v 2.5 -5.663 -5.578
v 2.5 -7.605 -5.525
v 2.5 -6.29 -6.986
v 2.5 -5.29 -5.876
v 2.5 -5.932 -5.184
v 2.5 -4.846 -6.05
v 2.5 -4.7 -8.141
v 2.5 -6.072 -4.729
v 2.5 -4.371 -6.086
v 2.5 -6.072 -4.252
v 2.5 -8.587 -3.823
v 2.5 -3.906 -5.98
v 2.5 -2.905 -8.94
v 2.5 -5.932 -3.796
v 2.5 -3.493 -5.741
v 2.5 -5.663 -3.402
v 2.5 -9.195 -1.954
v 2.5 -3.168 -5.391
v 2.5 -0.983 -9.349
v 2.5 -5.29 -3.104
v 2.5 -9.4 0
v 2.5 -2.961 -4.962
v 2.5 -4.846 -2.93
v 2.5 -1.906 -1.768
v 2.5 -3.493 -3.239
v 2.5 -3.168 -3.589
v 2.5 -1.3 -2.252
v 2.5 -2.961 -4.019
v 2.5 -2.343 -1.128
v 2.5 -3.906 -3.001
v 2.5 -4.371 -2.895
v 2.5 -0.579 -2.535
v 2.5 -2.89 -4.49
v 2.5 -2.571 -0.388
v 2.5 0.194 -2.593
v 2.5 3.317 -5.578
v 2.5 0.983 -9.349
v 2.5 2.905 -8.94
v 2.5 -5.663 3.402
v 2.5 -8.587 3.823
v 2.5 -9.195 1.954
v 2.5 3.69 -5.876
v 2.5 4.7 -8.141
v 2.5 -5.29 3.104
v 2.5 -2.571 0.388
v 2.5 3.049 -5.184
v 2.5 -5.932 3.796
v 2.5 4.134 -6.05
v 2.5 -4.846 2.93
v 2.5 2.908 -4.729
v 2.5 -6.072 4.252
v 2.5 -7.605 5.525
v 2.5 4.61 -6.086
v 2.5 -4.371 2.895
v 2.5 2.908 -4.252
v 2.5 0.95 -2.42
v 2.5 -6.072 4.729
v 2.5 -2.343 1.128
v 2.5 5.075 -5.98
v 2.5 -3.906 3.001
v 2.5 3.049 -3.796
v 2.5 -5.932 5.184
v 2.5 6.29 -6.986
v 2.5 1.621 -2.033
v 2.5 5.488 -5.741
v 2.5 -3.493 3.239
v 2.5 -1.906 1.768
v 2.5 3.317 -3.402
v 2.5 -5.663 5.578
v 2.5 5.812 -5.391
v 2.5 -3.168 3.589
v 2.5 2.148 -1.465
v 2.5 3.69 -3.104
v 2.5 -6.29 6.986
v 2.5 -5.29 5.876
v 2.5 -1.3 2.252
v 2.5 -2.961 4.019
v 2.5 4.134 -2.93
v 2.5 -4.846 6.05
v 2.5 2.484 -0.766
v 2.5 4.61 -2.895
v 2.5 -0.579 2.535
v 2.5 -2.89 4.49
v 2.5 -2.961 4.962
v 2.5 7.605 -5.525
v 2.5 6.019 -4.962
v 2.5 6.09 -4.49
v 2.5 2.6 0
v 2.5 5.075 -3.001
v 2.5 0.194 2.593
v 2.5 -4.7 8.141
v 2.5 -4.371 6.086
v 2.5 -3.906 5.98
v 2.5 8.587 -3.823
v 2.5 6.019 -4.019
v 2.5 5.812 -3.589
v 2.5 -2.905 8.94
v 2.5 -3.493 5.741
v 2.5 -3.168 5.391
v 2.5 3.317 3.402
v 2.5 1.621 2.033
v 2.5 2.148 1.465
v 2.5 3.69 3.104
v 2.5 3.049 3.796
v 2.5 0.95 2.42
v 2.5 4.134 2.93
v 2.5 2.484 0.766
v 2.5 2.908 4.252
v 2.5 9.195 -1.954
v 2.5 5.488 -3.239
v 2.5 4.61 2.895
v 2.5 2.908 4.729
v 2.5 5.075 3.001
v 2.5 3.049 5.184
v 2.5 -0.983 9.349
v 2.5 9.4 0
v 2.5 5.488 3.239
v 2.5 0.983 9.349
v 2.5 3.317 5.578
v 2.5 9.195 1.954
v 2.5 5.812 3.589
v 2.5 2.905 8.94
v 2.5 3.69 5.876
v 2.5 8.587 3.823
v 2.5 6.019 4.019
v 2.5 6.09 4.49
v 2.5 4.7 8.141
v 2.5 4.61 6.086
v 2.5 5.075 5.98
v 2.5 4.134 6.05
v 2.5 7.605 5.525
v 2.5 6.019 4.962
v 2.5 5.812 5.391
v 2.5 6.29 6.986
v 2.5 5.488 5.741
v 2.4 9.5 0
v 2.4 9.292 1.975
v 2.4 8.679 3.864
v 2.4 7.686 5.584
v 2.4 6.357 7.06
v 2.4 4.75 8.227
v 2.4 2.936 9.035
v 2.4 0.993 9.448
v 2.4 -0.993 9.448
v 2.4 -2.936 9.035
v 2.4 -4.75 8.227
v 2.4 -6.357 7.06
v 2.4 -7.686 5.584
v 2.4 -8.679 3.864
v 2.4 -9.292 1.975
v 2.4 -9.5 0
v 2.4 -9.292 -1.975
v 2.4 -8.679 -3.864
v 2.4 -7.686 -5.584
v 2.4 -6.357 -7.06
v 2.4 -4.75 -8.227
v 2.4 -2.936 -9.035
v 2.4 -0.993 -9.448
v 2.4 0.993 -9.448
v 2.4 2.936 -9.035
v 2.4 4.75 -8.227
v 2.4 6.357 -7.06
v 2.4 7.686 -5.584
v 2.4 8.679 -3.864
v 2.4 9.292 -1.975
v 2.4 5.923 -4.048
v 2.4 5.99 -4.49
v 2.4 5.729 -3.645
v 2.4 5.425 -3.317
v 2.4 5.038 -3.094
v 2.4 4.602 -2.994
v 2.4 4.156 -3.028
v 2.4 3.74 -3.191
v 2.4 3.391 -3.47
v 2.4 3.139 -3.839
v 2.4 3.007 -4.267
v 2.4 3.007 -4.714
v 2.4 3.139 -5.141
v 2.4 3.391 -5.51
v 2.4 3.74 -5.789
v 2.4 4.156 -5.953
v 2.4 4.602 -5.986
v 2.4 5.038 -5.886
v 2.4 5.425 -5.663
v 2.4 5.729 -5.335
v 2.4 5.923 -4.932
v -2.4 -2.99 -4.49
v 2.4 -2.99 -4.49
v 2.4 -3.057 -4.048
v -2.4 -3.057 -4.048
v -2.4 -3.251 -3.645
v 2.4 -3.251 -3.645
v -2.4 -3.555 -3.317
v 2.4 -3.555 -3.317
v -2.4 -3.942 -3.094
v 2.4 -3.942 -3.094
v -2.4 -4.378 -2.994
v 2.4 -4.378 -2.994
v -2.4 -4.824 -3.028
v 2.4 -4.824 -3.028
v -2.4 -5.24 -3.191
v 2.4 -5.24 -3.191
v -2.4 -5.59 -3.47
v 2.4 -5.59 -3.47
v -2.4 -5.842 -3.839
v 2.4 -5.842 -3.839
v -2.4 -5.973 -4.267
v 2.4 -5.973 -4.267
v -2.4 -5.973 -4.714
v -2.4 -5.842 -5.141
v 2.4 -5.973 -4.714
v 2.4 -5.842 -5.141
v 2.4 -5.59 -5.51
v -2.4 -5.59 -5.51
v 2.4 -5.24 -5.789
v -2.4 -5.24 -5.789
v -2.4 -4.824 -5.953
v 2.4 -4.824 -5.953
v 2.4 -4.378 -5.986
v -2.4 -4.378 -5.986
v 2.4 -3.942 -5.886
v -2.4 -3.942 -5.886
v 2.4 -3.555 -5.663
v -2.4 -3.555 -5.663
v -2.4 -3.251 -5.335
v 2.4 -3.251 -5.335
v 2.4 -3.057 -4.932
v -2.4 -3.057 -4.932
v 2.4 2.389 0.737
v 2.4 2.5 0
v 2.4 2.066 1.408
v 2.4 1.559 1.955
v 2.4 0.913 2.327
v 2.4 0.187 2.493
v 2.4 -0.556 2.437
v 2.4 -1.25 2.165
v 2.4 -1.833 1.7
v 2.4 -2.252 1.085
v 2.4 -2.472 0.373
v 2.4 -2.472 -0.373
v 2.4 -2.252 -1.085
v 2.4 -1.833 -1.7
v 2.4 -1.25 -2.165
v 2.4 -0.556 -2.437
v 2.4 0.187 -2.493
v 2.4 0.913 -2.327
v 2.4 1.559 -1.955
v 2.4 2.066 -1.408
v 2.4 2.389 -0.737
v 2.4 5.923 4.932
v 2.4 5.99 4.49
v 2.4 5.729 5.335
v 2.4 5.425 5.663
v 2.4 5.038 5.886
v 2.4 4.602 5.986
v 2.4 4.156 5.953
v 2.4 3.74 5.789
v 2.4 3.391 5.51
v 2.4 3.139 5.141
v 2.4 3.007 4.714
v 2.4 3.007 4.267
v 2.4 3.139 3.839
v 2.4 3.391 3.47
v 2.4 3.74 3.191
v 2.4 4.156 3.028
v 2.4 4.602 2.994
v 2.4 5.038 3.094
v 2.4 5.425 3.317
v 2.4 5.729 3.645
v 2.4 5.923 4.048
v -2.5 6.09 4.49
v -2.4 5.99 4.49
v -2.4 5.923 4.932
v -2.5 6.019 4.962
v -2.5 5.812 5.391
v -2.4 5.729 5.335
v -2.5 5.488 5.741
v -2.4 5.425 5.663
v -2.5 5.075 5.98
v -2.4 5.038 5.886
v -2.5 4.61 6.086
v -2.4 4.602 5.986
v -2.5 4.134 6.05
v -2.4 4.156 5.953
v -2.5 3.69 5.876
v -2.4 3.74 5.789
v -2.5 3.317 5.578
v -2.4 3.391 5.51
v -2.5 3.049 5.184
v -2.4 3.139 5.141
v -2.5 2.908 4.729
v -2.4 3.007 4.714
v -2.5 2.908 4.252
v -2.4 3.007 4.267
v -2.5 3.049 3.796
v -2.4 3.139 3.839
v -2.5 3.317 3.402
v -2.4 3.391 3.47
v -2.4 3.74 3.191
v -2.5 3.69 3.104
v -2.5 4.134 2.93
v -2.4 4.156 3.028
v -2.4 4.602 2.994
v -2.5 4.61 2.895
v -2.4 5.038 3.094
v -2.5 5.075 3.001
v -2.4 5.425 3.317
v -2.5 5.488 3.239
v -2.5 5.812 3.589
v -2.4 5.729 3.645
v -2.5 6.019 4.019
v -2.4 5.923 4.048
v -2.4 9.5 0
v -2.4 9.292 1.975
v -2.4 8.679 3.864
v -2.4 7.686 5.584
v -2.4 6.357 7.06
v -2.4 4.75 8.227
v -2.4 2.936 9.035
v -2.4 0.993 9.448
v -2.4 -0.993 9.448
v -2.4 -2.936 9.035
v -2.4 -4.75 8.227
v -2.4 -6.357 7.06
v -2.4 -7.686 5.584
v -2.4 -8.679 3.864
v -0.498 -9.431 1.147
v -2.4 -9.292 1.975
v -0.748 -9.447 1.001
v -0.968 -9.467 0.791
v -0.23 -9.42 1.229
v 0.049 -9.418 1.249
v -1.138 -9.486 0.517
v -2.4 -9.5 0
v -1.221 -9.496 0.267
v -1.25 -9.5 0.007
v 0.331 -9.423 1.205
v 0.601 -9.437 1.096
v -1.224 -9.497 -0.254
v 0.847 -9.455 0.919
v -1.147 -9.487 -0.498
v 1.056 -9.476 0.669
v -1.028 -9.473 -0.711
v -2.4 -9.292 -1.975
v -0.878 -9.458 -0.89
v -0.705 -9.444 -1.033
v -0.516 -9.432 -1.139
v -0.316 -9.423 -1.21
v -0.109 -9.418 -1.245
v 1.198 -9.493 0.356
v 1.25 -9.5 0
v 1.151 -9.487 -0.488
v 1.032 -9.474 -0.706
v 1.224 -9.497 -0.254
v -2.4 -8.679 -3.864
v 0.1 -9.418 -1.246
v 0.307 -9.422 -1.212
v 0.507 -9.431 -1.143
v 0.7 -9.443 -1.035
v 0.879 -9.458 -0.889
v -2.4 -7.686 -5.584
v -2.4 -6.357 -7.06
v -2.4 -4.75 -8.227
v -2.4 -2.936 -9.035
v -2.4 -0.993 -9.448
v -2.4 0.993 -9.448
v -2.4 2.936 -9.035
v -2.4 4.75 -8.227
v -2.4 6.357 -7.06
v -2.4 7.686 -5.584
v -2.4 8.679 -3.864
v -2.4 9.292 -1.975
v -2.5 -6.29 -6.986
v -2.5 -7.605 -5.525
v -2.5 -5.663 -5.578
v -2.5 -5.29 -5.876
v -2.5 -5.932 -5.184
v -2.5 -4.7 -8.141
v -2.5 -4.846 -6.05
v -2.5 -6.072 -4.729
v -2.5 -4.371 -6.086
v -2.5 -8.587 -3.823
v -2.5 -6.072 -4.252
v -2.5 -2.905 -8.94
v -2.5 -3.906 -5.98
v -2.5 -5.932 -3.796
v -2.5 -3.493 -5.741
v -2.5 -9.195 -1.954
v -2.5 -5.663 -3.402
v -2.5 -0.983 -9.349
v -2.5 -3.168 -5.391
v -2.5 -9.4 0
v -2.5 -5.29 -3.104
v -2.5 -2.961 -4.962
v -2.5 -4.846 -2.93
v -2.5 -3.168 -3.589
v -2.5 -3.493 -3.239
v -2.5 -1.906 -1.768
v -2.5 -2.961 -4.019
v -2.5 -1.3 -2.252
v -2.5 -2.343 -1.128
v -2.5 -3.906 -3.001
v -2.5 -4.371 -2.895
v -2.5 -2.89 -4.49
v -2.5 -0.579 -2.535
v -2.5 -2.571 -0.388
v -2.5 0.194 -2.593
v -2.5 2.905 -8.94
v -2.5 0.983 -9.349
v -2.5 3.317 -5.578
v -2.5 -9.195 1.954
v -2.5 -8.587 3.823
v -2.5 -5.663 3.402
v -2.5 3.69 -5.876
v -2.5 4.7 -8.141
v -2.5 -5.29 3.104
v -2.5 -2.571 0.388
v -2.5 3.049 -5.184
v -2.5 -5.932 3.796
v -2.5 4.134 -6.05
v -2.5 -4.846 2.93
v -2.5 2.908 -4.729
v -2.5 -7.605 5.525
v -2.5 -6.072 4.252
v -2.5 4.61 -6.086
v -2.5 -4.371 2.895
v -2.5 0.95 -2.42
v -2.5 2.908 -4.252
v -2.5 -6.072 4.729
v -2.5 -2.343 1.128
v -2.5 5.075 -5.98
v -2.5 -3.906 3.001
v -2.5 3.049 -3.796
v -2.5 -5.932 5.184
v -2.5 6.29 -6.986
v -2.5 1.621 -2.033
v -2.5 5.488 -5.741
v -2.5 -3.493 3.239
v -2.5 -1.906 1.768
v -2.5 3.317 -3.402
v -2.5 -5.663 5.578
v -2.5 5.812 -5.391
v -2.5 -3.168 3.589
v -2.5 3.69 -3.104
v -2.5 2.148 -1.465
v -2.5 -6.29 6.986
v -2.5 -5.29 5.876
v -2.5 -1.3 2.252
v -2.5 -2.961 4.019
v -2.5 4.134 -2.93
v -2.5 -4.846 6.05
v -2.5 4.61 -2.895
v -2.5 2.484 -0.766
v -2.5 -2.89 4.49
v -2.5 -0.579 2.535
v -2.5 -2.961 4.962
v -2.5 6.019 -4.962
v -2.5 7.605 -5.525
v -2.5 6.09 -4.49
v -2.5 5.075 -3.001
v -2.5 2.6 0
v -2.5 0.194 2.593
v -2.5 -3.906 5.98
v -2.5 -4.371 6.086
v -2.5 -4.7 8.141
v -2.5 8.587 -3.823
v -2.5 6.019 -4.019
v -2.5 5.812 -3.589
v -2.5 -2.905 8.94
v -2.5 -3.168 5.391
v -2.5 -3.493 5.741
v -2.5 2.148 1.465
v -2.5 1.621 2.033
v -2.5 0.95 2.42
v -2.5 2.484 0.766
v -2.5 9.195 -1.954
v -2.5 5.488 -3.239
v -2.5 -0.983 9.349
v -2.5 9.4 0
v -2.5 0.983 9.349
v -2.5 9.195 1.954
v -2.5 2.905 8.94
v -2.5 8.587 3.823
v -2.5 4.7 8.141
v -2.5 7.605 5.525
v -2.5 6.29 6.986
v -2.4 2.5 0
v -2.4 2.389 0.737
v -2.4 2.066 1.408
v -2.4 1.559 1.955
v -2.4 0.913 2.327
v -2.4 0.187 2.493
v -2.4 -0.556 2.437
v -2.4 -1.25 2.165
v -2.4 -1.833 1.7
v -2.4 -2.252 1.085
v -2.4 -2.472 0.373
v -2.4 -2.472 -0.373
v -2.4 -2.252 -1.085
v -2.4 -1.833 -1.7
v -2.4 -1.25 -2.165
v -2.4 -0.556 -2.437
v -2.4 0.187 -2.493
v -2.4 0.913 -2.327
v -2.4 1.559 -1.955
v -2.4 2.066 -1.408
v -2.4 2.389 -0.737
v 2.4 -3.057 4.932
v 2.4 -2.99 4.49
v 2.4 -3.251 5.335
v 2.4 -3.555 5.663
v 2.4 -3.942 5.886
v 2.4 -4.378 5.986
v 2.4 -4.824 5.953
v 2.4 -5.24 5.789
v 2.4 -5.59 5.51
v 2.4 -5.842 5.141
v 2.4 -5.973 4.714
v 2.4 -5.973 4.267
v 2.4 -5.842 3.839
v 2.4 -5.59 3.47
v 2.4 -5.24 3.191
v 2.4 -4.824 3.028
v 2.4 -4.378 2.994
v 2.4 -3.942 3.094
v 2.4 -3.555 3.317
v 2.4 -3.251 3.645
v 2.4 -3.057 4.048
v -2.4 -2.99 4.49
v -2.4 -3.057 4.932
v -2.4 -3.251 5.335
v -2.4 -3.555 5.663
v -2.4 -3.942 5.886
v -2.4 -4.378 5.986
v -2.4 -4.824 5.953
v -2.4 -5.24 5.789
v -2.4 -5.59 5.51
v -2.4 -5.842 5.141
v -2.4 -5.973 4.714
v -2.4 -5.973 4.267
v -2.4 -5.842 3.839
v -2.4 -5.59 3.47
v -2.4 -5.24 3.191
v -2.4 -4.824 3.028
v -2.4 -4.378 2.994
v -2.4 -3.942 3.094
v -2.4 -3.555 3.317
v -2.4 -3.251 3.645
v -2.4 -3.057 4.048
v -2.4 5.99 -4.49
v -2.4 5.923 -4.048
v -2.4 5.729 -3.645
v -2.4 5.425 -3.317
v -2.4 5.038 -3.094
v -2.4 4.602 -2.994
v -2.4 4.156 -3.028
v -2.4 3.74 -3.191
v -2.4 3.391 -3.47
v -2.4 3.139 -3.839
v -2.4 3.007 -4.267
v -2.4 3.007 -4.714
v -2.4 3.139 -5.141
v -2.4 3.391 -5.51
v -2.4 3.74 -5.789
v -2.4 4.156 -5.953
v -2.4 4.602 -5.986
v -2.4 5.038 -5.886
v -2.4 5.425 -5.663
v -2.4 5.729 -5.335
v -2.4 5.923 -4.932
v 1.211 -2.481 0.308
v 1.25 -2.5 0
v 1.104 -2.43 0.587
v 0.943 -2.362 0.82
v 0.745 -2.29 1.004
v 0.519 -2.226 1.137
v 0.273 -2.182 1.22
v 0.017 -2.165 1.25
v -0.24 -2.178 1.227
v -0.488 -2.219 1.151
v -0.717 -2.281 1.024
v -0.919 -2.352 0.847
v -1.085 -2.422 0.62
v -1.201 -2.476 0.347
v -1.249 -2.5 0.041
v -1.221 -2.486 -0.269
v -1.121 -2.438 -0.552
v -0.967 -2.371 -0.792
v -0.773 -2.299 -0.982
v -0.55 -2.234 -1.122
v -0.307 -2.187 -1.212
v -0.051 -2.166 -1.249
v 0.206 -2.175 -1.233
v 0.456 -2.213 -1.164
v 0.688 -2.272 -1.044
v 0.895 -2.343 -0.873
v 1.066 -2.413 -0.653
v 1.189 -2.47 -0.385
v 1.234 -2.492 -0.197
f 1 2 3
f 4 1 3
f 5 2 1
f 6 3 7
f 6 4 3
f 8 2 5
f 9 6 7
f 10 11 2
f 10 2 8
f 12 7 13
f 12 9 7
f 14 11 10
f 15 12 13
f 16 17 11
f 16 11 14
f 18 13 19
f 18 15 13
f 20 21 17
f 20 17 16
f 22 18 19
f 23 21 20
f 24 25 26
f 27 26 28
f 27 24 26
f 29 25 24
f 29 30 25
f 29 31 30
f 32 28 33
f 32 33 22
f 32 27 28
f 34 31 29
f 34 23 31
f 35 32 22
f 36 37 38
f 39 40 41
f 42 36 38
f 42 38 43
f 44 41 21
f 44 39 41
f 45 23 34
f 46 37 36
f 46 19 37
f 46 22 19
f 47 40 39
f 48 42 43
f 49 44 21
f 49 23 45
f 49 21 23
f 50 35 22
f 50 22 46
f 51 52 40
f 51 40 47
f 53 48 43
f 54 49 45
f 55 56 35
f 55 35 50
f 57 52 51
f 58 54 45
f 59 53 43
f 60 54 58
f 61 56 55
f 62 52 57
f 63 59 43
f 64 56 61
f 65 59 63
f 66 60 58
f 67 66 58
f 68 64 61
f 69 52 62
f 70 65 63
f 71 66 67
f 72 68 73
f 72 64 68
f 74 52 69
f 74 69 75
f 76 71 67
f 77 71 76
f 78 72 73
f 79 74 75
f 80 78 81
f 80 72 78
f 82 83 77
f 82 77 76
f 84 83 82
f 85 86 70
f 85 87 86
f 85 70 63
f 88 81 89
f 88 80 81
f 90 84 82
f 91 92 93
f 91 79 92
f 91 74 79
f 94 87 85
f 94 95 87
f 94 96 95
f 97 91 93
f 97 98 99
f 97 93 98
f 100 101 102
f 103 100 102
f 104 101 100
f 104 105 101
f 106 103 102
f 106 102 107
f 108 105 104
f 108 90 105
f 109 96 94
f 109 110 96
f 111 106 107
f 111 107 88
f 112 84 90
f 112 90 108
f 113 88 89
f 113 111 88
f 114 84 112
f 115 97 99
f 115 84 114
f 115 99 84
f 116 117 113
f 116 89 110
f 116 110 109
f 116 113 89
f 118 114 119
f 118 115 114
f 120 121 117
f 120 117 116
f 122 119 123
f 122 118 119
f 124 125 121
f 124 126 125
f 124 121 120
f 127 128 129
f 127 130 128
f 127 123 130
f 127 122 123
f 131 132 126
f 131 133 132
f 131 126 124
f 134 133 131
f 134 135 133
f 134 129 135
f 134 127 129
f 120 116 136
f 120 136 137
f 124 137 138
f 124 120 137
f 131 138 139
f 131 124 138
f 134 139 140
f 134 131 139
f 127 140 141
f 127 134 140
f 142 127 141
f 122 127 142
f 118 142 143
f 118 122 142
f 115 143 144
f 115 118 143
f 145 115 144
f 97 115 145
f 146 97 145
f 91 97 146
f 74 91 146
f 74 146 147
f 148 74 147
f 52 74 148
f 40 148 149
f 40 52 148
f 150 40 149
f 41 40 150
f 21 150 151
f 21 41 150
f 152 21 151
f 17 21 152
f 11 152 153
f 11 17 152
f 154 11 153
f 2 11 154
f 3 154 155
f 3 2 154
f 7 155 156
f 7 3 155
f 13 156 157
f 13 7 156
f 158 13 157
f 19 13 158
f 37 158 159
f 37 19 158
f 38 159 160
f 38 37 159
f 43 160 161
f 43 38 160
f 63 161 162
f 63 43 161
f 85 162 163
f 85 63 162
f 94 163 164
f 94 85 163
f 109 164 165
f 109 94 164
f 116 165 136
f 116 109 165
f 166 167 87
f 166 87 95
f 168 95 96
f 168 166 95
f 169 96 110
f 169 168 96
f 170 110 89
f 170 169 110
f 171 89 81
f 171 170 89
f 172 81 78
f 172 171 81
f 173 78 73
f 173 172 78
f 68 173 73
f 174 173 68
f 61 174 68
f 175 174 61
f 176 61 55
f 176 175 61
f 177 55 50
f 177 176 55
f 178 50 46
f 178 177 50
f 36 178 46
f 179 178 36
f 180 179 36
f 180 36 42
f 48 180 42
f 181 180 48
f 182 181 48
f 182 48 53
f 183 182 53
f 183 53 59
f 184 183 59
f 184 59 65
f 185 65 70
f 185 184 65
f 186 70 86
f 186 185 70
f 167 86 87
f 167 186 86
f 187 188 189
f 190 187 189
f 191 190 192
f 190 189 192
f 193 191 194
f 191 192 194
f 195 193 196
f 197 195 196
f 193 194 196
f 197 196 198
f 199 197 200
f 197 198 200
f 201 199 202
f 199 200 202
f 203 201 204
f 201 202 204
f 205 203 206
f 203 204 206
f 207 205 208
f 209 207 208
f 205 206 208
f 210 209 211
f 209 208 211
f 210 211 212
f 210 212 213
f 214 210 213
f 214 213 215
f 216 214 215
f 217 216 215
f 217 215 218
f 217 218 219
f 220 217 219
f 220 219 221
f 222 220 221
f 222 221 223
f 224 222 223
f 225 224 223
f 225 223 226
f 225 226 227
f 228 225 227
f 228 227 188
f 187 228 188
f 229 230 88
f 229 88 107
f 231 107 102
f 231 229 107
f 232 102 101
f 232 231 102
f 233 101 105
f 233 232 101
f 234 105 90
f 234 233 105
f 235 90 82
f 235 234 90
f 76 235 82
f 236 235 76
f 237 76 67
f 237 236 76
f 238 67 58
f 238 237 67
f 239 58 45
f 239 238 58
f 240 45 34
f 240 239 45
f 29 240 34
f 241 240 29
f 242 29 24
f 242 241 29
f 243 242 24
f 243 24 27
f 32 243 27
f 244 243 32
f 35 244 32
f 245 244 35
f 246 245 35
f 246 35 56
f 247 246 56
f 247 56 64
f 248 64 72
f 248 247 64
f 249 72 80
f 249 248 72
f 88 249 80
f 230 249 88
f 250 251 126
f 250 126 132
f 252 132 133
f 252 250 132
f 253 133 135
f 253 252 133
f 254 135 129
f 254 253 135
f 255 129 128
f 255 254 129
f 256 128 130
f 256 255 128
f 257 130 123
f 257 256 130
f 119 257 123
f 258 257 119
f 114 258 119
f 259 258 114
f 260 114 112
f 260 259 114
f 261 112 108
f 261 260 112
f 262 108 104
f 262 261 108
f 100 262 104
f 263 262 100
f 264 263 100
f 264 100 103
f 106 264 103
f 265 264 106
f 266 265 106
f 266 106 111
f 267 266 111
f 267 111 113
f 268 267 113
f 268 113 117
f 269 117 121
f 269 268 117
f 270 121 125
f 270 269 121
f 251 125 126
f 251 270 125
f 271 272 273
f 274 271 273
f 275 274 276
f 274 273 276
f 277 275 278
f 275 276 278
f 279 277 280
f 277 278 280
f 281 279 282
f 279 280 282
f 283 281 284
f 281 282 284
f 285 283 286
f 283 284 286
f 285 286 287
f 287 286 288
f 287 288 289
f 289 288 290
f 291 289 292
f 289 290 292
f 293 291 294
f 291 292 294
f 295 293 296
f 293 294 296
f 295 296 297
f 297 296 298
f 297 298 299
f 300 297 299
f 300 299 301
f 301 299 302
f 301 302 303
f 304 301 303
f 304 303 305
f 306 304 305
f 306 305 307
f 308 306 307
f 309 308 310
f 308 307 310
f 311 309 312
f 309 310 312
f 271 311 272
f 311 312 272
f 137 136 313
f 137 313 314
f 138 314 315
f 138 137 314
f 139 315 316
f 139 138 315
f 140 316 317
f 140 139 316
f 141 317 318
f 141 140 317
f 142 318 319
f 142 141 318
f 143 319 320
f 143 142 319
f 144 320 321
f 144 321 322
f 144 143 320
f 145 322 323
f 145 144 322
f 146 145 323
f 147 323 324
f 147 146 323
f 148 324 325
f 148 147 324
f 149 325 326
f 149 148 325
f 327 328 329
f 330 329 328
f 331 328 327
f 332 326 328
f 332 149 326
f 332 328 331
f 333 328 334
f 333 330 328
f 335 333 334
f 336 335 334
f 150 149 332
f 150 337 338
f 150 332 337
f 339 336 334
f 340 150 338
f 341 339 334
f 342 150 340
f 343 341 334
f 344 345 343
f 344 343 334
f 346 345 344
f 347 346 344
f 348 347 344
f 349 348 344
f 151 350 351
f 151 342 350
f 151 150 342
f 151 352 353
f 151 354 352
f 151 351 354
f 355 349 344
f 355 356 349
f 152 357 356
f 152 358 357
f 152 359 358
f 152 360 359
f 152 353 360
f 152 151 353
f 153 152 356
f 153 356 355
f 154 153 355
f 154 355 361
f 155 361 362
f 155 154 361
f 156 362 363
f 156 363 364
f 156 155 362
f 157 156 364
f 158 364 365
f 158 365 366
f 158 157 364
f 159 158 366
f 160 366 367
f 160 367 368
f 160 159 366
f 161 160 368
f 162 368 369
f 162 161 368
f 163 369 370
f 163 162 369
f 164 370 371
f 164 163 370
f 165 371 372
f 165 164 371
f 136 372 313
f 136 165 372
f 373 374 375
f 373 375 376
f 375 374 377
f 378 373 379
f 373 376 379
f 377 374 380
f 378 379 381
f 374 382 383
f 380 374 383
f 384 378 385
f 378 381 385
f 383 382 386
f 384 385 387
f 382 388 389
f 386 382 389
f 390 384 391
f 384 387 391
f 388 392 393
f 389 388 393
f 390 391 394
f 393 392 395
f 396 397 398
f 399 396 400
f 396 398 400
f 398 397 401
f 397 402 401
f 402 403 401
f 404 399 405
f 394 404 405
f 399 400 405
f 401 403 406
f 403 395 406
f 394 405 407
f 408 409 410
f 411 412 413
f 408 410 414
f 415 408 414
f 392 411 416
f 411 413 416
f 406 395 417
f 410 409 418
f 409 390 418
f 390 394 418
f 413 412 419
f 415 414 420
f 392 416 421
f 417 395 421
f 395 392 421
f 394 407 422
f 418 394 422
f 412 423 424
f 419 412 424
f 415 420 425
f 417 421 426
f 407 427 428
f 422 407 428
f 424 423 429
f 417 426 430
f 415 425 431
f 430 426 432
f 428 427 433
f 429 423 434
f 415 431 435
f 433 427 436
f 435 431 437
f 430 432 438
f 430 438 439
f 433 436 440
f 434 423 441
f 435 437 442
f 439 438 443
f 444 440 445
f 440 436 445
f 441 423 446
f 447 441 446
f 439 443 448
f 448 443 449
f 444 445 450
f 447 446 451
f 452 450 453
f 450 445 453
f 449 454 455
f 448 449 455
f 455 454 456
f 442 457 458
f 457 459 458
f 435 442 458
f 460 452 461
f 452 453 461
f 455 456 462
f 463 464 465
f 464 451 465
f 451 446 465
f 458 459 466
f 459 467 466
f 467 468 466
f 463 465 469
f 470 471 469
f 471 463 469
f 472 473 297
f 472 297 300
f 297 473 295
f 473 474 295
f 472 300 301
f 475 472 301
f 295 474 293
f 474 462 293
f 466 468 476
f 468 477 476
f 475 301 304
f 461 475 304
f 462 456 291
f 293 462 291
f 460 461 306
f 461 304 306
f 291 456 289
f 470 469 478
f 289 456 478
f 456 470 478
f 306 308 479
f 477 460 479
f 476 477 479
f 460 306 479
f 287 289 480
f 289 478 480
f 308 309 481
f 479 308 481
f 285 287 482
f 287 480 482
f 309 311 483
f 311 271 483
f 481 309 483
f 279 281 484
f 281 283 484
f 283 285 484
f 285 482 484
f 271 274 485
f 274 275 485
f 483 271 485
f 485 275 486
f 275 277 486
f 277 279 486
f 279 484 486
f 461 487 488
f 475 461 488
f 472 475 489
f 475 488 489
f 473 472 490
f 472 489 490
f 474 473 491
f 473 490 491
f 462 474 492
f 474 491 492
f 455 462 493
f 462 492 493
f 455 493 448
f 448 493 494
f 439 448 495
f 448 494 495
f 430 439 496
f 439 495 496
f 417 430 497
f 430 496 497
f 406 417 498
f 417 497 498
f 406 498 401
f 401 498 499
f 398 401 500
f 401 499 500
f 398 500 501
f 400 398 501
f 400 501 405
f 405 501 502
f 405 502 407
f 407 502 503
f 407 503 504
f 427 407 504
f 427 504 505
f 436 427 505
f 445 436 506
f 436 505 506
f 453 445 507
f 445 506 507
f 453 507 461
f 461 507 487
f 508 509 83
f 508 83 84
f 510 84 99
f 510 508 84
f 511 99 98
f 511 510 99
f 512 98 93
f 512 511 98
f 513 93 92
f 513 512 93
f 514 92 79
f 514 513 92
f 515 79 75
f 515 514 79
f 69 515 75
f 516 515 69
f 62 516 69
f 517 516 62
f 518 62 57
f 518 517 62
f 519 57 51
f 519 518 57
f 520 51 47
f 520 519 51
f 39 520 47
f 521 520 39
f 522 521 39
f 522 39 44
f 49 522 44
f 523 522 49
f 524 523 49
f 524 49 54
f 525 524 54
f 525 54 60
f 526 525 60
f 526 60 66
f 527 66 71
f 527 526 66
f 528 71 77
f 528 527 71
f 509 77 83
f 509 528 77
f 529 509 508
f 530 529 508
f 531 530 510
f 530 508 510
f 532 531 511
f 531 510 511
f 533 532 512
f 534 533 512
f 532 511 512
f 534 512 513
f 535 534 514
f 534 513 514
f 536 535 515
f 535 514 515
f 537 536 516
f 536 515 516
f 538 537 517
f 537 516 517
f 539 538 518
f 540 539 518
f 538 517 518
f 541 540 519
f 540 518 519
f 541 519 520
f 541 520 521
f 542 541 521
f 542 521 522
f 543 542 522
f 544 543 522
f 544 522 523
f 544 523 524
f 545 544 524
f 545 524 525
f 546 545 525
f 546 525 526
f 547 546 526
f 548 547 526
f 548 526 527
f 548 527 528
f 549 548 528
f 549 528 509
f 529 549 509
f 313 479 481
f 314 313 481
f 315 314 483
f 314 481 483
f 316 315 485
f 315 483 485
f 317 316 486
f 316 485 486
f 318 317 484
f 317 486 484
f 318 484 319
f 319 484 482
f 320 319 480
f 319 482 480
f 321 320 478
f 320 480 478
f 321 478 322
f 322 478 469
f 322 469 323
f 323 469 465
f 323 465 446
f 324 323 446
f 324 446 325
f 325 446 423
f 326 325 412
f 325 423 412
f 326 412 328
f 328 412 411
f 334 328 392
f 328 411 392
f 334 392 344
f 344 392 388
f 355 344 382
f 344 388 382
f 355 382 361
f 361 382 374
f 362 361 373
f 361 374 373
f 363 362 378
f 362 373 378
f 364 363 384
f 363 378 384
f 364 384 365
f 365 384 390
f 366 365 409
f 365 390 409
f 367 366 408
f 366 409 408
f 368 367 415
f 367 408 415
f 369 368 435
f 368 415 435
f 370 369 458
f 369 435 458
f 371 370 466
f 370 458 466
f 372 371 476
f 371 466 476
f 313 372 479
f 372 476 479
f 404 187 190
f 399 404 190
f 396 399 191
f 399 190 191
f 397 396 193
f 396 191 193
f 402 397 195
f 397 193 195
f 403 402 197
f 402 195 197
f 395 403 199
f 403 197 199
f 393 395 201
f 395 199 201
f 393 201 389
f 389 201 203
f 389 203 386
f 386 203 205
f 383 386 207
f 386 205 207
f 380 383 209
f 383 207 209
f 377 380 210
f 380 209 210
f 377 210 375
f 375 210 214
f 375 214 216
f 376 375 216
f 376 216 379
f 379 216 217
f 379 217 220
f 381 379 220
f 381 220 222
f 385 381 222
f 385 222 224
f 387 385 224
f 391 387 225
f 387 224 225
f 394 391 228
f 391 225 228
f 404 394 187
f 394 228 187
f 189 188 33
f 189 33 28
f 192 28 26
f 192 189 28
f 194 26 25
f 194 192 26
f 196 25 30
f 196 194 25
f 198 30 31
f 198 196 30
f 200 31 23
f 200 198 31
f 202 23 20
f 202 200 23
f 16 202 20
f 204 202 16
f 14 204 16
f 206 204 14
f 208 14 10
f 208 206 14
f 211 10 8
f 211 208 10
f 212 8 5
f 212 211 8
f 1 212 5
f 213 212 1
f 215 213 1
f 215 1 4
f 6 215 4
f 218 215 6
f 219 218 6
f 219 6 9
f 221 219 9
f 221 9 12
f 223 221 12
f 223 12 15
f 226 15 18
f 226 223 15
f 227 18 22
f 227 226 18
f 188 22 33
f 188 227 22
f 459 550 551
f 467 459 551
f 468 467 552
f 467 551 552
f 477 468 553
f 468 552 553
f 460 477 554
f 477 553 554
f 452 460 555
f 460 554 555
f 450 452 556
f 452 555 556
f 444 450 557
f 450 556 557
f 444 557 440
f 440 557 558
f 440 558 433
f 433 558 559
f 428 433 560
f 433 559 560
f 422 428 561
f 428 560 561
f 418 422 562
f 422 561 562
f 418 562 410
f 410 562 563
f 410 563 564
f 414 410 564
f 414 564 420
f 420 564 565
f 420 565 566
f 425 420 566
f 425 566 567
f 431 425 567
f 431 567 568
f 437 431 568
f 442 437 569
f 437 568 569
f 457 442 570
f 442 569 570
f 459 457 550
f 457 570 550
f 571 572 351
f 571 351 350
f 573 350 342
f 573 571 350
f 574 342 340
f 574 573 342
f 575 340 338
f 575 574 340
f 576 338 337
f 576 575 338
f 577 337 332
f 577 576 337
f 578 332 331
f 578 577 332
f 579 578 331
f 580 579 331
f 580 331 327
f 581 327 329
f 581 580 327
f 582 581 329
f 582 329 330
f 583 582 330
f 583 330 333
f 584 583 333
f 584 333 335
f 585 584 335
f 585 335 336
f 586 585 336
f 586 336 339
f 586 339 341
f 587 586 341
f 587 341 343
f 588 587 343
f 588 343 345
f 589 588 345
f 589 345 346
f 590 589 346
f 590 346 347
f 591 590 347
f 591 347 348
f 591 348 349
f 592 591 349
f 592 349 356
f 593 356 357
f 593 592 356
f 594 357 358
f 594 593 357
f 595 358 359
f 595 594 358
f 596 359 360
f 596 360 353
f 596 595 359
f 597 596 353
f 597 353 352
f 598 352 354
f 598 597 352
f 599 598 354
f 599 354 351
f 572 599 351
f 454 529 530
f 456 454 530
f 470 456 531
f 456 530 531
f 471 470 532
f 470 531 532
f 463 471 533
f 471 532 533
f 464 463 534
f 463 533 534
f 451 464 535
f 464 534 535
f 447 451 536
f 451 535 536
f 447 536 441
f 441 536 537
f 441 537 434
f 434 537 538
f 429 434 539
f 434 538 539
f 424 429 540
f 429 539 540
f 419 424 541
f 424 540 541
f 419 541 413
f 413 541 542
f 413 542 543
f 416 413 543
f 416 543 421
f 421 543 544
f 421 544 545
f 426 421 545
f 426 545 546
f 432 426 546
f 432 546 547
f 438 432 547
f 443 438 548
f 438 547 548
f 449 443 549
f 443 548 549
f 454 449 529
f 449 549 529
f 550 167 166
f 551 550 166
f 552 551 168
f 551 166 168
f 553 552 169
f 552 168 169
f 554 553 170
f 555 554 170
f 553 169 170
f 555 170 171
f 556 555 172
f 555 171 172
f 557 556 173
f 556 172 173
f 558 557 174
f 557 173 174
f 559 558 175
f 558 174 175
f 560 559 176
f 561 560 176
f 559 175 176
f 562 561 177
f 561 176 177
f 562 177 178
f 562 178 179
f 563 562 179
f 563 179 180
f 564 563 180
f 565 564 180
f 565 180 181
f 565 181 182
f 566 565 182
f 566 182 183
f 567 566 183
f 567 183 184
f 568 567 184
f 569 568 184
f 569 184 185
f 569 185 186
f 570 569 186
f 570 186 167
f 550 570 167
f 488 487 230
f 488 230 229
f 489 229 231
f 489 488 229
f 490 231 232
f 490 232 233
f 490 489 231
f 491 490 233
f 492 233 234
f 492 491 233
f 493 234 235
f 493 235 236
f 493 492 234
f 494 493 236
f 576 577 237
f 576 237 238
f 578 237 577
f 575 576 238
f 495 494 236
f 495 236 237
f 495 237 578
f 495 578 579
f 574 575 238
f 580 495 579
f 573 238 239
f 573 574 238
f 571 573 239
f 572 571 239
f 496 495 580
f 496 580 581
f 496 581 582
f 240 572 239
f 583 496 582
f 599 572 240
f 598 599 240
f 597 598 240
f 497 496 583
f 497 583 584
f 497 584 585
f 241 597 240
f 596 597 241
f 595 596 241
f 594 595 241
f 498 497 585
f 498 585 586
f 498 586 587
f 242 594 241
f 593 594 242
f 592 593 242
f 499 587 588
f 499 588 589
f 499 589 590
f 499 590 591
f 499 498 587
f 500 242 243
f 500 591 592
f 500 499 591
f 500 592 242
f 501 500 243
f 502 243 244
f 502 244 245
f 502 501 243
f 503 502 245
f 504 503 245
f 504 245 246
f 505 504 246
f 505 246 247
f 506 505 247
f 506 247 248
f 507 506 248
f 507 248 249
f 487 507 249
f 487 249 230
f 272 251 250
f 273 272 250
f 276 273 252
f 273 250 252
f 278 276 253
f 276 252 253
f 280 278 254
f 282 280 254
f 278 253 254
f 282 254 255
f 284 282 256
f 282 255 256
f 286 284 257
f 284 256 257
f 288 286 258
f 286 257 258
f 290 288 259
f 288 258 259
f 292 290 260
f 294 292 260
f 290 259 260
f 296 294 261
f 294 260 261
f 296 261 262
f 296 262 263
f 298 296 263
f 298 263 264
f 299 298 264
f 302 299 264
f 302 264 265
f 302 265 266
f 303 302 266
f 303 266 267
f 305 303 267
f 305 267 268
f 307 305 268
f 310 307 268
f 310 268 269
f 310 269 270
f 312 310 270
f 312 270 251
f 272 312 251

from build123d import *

# Parameters (mm, degrees)
F0_R     = 9.5
F0_R_2   = 2.5
F1_DEPTH = 2.5
F2_R     = 1.5
F3_DEPTH = 5.001
F4_R     = 1.25
F5_DEPTH = 9.501
F6_SIZE  = 0.1


with BuildPart() as f1:
    # F0 (on Right) → F1 (new body, symmetric)
    with BuildSketch(Plane.YZ):
        Circle(F0_R)
        Circle(F0_R_2, mode=Mode.SUBTRACT)
    extrude(amount=F1_DEPTH, both=True)

    # F2 (on face) → F3 (cut, through all)
    with BuildSketch(Plane.YZ.offset(2.5)):
        with Locations((-4.490128, 4.490128)):
            Circle(F2_R)
        with Locations((-4.490128, -4.490128)):
            Circle(F2_R)
        with Locations((4.490128, -4.490128)):
            Circle(F2_R)
        with Locations((4.490128, 4.490128)):
            Circle(F2_R)
    extrude(amount=-F3_DEPTH, mode=Mode.SUBTRACT)

    # F4 (on Front) → F5 (cut, through all)
    with BuildSketch(Plane.XZ):
        Circle(F4_R)
    extrude(amount=F5_DEPTH, mode=Mode.SUBTRACT)

    # F6
    f6_edges = [f1.edges().sort_by_distance(p)[0] for p in [
        (2.5, -9.5, 0),
        (2.5, -5.990128, -4.490128),
        (2.5, 2.990128, -4.490128),
        (2.5, -5.990128, 4.490128),
        (2.5, -2.5, 0),
        (2.5, 2.990128, 4.490128),
        (-2.5, -9.5, 0),
        (-2.5, -5.990128, -4.490128),
        (-2.5, 2.990128, -4.490128),
        (-2.5, -5.990128, 4.490128),
        (-2.5, -2.5, 0),
        (-2.5, 2.990128, 4.490128),
    ]]
    chamfer(f6_edges, length=F6_SIZE)


solid = f1.part
